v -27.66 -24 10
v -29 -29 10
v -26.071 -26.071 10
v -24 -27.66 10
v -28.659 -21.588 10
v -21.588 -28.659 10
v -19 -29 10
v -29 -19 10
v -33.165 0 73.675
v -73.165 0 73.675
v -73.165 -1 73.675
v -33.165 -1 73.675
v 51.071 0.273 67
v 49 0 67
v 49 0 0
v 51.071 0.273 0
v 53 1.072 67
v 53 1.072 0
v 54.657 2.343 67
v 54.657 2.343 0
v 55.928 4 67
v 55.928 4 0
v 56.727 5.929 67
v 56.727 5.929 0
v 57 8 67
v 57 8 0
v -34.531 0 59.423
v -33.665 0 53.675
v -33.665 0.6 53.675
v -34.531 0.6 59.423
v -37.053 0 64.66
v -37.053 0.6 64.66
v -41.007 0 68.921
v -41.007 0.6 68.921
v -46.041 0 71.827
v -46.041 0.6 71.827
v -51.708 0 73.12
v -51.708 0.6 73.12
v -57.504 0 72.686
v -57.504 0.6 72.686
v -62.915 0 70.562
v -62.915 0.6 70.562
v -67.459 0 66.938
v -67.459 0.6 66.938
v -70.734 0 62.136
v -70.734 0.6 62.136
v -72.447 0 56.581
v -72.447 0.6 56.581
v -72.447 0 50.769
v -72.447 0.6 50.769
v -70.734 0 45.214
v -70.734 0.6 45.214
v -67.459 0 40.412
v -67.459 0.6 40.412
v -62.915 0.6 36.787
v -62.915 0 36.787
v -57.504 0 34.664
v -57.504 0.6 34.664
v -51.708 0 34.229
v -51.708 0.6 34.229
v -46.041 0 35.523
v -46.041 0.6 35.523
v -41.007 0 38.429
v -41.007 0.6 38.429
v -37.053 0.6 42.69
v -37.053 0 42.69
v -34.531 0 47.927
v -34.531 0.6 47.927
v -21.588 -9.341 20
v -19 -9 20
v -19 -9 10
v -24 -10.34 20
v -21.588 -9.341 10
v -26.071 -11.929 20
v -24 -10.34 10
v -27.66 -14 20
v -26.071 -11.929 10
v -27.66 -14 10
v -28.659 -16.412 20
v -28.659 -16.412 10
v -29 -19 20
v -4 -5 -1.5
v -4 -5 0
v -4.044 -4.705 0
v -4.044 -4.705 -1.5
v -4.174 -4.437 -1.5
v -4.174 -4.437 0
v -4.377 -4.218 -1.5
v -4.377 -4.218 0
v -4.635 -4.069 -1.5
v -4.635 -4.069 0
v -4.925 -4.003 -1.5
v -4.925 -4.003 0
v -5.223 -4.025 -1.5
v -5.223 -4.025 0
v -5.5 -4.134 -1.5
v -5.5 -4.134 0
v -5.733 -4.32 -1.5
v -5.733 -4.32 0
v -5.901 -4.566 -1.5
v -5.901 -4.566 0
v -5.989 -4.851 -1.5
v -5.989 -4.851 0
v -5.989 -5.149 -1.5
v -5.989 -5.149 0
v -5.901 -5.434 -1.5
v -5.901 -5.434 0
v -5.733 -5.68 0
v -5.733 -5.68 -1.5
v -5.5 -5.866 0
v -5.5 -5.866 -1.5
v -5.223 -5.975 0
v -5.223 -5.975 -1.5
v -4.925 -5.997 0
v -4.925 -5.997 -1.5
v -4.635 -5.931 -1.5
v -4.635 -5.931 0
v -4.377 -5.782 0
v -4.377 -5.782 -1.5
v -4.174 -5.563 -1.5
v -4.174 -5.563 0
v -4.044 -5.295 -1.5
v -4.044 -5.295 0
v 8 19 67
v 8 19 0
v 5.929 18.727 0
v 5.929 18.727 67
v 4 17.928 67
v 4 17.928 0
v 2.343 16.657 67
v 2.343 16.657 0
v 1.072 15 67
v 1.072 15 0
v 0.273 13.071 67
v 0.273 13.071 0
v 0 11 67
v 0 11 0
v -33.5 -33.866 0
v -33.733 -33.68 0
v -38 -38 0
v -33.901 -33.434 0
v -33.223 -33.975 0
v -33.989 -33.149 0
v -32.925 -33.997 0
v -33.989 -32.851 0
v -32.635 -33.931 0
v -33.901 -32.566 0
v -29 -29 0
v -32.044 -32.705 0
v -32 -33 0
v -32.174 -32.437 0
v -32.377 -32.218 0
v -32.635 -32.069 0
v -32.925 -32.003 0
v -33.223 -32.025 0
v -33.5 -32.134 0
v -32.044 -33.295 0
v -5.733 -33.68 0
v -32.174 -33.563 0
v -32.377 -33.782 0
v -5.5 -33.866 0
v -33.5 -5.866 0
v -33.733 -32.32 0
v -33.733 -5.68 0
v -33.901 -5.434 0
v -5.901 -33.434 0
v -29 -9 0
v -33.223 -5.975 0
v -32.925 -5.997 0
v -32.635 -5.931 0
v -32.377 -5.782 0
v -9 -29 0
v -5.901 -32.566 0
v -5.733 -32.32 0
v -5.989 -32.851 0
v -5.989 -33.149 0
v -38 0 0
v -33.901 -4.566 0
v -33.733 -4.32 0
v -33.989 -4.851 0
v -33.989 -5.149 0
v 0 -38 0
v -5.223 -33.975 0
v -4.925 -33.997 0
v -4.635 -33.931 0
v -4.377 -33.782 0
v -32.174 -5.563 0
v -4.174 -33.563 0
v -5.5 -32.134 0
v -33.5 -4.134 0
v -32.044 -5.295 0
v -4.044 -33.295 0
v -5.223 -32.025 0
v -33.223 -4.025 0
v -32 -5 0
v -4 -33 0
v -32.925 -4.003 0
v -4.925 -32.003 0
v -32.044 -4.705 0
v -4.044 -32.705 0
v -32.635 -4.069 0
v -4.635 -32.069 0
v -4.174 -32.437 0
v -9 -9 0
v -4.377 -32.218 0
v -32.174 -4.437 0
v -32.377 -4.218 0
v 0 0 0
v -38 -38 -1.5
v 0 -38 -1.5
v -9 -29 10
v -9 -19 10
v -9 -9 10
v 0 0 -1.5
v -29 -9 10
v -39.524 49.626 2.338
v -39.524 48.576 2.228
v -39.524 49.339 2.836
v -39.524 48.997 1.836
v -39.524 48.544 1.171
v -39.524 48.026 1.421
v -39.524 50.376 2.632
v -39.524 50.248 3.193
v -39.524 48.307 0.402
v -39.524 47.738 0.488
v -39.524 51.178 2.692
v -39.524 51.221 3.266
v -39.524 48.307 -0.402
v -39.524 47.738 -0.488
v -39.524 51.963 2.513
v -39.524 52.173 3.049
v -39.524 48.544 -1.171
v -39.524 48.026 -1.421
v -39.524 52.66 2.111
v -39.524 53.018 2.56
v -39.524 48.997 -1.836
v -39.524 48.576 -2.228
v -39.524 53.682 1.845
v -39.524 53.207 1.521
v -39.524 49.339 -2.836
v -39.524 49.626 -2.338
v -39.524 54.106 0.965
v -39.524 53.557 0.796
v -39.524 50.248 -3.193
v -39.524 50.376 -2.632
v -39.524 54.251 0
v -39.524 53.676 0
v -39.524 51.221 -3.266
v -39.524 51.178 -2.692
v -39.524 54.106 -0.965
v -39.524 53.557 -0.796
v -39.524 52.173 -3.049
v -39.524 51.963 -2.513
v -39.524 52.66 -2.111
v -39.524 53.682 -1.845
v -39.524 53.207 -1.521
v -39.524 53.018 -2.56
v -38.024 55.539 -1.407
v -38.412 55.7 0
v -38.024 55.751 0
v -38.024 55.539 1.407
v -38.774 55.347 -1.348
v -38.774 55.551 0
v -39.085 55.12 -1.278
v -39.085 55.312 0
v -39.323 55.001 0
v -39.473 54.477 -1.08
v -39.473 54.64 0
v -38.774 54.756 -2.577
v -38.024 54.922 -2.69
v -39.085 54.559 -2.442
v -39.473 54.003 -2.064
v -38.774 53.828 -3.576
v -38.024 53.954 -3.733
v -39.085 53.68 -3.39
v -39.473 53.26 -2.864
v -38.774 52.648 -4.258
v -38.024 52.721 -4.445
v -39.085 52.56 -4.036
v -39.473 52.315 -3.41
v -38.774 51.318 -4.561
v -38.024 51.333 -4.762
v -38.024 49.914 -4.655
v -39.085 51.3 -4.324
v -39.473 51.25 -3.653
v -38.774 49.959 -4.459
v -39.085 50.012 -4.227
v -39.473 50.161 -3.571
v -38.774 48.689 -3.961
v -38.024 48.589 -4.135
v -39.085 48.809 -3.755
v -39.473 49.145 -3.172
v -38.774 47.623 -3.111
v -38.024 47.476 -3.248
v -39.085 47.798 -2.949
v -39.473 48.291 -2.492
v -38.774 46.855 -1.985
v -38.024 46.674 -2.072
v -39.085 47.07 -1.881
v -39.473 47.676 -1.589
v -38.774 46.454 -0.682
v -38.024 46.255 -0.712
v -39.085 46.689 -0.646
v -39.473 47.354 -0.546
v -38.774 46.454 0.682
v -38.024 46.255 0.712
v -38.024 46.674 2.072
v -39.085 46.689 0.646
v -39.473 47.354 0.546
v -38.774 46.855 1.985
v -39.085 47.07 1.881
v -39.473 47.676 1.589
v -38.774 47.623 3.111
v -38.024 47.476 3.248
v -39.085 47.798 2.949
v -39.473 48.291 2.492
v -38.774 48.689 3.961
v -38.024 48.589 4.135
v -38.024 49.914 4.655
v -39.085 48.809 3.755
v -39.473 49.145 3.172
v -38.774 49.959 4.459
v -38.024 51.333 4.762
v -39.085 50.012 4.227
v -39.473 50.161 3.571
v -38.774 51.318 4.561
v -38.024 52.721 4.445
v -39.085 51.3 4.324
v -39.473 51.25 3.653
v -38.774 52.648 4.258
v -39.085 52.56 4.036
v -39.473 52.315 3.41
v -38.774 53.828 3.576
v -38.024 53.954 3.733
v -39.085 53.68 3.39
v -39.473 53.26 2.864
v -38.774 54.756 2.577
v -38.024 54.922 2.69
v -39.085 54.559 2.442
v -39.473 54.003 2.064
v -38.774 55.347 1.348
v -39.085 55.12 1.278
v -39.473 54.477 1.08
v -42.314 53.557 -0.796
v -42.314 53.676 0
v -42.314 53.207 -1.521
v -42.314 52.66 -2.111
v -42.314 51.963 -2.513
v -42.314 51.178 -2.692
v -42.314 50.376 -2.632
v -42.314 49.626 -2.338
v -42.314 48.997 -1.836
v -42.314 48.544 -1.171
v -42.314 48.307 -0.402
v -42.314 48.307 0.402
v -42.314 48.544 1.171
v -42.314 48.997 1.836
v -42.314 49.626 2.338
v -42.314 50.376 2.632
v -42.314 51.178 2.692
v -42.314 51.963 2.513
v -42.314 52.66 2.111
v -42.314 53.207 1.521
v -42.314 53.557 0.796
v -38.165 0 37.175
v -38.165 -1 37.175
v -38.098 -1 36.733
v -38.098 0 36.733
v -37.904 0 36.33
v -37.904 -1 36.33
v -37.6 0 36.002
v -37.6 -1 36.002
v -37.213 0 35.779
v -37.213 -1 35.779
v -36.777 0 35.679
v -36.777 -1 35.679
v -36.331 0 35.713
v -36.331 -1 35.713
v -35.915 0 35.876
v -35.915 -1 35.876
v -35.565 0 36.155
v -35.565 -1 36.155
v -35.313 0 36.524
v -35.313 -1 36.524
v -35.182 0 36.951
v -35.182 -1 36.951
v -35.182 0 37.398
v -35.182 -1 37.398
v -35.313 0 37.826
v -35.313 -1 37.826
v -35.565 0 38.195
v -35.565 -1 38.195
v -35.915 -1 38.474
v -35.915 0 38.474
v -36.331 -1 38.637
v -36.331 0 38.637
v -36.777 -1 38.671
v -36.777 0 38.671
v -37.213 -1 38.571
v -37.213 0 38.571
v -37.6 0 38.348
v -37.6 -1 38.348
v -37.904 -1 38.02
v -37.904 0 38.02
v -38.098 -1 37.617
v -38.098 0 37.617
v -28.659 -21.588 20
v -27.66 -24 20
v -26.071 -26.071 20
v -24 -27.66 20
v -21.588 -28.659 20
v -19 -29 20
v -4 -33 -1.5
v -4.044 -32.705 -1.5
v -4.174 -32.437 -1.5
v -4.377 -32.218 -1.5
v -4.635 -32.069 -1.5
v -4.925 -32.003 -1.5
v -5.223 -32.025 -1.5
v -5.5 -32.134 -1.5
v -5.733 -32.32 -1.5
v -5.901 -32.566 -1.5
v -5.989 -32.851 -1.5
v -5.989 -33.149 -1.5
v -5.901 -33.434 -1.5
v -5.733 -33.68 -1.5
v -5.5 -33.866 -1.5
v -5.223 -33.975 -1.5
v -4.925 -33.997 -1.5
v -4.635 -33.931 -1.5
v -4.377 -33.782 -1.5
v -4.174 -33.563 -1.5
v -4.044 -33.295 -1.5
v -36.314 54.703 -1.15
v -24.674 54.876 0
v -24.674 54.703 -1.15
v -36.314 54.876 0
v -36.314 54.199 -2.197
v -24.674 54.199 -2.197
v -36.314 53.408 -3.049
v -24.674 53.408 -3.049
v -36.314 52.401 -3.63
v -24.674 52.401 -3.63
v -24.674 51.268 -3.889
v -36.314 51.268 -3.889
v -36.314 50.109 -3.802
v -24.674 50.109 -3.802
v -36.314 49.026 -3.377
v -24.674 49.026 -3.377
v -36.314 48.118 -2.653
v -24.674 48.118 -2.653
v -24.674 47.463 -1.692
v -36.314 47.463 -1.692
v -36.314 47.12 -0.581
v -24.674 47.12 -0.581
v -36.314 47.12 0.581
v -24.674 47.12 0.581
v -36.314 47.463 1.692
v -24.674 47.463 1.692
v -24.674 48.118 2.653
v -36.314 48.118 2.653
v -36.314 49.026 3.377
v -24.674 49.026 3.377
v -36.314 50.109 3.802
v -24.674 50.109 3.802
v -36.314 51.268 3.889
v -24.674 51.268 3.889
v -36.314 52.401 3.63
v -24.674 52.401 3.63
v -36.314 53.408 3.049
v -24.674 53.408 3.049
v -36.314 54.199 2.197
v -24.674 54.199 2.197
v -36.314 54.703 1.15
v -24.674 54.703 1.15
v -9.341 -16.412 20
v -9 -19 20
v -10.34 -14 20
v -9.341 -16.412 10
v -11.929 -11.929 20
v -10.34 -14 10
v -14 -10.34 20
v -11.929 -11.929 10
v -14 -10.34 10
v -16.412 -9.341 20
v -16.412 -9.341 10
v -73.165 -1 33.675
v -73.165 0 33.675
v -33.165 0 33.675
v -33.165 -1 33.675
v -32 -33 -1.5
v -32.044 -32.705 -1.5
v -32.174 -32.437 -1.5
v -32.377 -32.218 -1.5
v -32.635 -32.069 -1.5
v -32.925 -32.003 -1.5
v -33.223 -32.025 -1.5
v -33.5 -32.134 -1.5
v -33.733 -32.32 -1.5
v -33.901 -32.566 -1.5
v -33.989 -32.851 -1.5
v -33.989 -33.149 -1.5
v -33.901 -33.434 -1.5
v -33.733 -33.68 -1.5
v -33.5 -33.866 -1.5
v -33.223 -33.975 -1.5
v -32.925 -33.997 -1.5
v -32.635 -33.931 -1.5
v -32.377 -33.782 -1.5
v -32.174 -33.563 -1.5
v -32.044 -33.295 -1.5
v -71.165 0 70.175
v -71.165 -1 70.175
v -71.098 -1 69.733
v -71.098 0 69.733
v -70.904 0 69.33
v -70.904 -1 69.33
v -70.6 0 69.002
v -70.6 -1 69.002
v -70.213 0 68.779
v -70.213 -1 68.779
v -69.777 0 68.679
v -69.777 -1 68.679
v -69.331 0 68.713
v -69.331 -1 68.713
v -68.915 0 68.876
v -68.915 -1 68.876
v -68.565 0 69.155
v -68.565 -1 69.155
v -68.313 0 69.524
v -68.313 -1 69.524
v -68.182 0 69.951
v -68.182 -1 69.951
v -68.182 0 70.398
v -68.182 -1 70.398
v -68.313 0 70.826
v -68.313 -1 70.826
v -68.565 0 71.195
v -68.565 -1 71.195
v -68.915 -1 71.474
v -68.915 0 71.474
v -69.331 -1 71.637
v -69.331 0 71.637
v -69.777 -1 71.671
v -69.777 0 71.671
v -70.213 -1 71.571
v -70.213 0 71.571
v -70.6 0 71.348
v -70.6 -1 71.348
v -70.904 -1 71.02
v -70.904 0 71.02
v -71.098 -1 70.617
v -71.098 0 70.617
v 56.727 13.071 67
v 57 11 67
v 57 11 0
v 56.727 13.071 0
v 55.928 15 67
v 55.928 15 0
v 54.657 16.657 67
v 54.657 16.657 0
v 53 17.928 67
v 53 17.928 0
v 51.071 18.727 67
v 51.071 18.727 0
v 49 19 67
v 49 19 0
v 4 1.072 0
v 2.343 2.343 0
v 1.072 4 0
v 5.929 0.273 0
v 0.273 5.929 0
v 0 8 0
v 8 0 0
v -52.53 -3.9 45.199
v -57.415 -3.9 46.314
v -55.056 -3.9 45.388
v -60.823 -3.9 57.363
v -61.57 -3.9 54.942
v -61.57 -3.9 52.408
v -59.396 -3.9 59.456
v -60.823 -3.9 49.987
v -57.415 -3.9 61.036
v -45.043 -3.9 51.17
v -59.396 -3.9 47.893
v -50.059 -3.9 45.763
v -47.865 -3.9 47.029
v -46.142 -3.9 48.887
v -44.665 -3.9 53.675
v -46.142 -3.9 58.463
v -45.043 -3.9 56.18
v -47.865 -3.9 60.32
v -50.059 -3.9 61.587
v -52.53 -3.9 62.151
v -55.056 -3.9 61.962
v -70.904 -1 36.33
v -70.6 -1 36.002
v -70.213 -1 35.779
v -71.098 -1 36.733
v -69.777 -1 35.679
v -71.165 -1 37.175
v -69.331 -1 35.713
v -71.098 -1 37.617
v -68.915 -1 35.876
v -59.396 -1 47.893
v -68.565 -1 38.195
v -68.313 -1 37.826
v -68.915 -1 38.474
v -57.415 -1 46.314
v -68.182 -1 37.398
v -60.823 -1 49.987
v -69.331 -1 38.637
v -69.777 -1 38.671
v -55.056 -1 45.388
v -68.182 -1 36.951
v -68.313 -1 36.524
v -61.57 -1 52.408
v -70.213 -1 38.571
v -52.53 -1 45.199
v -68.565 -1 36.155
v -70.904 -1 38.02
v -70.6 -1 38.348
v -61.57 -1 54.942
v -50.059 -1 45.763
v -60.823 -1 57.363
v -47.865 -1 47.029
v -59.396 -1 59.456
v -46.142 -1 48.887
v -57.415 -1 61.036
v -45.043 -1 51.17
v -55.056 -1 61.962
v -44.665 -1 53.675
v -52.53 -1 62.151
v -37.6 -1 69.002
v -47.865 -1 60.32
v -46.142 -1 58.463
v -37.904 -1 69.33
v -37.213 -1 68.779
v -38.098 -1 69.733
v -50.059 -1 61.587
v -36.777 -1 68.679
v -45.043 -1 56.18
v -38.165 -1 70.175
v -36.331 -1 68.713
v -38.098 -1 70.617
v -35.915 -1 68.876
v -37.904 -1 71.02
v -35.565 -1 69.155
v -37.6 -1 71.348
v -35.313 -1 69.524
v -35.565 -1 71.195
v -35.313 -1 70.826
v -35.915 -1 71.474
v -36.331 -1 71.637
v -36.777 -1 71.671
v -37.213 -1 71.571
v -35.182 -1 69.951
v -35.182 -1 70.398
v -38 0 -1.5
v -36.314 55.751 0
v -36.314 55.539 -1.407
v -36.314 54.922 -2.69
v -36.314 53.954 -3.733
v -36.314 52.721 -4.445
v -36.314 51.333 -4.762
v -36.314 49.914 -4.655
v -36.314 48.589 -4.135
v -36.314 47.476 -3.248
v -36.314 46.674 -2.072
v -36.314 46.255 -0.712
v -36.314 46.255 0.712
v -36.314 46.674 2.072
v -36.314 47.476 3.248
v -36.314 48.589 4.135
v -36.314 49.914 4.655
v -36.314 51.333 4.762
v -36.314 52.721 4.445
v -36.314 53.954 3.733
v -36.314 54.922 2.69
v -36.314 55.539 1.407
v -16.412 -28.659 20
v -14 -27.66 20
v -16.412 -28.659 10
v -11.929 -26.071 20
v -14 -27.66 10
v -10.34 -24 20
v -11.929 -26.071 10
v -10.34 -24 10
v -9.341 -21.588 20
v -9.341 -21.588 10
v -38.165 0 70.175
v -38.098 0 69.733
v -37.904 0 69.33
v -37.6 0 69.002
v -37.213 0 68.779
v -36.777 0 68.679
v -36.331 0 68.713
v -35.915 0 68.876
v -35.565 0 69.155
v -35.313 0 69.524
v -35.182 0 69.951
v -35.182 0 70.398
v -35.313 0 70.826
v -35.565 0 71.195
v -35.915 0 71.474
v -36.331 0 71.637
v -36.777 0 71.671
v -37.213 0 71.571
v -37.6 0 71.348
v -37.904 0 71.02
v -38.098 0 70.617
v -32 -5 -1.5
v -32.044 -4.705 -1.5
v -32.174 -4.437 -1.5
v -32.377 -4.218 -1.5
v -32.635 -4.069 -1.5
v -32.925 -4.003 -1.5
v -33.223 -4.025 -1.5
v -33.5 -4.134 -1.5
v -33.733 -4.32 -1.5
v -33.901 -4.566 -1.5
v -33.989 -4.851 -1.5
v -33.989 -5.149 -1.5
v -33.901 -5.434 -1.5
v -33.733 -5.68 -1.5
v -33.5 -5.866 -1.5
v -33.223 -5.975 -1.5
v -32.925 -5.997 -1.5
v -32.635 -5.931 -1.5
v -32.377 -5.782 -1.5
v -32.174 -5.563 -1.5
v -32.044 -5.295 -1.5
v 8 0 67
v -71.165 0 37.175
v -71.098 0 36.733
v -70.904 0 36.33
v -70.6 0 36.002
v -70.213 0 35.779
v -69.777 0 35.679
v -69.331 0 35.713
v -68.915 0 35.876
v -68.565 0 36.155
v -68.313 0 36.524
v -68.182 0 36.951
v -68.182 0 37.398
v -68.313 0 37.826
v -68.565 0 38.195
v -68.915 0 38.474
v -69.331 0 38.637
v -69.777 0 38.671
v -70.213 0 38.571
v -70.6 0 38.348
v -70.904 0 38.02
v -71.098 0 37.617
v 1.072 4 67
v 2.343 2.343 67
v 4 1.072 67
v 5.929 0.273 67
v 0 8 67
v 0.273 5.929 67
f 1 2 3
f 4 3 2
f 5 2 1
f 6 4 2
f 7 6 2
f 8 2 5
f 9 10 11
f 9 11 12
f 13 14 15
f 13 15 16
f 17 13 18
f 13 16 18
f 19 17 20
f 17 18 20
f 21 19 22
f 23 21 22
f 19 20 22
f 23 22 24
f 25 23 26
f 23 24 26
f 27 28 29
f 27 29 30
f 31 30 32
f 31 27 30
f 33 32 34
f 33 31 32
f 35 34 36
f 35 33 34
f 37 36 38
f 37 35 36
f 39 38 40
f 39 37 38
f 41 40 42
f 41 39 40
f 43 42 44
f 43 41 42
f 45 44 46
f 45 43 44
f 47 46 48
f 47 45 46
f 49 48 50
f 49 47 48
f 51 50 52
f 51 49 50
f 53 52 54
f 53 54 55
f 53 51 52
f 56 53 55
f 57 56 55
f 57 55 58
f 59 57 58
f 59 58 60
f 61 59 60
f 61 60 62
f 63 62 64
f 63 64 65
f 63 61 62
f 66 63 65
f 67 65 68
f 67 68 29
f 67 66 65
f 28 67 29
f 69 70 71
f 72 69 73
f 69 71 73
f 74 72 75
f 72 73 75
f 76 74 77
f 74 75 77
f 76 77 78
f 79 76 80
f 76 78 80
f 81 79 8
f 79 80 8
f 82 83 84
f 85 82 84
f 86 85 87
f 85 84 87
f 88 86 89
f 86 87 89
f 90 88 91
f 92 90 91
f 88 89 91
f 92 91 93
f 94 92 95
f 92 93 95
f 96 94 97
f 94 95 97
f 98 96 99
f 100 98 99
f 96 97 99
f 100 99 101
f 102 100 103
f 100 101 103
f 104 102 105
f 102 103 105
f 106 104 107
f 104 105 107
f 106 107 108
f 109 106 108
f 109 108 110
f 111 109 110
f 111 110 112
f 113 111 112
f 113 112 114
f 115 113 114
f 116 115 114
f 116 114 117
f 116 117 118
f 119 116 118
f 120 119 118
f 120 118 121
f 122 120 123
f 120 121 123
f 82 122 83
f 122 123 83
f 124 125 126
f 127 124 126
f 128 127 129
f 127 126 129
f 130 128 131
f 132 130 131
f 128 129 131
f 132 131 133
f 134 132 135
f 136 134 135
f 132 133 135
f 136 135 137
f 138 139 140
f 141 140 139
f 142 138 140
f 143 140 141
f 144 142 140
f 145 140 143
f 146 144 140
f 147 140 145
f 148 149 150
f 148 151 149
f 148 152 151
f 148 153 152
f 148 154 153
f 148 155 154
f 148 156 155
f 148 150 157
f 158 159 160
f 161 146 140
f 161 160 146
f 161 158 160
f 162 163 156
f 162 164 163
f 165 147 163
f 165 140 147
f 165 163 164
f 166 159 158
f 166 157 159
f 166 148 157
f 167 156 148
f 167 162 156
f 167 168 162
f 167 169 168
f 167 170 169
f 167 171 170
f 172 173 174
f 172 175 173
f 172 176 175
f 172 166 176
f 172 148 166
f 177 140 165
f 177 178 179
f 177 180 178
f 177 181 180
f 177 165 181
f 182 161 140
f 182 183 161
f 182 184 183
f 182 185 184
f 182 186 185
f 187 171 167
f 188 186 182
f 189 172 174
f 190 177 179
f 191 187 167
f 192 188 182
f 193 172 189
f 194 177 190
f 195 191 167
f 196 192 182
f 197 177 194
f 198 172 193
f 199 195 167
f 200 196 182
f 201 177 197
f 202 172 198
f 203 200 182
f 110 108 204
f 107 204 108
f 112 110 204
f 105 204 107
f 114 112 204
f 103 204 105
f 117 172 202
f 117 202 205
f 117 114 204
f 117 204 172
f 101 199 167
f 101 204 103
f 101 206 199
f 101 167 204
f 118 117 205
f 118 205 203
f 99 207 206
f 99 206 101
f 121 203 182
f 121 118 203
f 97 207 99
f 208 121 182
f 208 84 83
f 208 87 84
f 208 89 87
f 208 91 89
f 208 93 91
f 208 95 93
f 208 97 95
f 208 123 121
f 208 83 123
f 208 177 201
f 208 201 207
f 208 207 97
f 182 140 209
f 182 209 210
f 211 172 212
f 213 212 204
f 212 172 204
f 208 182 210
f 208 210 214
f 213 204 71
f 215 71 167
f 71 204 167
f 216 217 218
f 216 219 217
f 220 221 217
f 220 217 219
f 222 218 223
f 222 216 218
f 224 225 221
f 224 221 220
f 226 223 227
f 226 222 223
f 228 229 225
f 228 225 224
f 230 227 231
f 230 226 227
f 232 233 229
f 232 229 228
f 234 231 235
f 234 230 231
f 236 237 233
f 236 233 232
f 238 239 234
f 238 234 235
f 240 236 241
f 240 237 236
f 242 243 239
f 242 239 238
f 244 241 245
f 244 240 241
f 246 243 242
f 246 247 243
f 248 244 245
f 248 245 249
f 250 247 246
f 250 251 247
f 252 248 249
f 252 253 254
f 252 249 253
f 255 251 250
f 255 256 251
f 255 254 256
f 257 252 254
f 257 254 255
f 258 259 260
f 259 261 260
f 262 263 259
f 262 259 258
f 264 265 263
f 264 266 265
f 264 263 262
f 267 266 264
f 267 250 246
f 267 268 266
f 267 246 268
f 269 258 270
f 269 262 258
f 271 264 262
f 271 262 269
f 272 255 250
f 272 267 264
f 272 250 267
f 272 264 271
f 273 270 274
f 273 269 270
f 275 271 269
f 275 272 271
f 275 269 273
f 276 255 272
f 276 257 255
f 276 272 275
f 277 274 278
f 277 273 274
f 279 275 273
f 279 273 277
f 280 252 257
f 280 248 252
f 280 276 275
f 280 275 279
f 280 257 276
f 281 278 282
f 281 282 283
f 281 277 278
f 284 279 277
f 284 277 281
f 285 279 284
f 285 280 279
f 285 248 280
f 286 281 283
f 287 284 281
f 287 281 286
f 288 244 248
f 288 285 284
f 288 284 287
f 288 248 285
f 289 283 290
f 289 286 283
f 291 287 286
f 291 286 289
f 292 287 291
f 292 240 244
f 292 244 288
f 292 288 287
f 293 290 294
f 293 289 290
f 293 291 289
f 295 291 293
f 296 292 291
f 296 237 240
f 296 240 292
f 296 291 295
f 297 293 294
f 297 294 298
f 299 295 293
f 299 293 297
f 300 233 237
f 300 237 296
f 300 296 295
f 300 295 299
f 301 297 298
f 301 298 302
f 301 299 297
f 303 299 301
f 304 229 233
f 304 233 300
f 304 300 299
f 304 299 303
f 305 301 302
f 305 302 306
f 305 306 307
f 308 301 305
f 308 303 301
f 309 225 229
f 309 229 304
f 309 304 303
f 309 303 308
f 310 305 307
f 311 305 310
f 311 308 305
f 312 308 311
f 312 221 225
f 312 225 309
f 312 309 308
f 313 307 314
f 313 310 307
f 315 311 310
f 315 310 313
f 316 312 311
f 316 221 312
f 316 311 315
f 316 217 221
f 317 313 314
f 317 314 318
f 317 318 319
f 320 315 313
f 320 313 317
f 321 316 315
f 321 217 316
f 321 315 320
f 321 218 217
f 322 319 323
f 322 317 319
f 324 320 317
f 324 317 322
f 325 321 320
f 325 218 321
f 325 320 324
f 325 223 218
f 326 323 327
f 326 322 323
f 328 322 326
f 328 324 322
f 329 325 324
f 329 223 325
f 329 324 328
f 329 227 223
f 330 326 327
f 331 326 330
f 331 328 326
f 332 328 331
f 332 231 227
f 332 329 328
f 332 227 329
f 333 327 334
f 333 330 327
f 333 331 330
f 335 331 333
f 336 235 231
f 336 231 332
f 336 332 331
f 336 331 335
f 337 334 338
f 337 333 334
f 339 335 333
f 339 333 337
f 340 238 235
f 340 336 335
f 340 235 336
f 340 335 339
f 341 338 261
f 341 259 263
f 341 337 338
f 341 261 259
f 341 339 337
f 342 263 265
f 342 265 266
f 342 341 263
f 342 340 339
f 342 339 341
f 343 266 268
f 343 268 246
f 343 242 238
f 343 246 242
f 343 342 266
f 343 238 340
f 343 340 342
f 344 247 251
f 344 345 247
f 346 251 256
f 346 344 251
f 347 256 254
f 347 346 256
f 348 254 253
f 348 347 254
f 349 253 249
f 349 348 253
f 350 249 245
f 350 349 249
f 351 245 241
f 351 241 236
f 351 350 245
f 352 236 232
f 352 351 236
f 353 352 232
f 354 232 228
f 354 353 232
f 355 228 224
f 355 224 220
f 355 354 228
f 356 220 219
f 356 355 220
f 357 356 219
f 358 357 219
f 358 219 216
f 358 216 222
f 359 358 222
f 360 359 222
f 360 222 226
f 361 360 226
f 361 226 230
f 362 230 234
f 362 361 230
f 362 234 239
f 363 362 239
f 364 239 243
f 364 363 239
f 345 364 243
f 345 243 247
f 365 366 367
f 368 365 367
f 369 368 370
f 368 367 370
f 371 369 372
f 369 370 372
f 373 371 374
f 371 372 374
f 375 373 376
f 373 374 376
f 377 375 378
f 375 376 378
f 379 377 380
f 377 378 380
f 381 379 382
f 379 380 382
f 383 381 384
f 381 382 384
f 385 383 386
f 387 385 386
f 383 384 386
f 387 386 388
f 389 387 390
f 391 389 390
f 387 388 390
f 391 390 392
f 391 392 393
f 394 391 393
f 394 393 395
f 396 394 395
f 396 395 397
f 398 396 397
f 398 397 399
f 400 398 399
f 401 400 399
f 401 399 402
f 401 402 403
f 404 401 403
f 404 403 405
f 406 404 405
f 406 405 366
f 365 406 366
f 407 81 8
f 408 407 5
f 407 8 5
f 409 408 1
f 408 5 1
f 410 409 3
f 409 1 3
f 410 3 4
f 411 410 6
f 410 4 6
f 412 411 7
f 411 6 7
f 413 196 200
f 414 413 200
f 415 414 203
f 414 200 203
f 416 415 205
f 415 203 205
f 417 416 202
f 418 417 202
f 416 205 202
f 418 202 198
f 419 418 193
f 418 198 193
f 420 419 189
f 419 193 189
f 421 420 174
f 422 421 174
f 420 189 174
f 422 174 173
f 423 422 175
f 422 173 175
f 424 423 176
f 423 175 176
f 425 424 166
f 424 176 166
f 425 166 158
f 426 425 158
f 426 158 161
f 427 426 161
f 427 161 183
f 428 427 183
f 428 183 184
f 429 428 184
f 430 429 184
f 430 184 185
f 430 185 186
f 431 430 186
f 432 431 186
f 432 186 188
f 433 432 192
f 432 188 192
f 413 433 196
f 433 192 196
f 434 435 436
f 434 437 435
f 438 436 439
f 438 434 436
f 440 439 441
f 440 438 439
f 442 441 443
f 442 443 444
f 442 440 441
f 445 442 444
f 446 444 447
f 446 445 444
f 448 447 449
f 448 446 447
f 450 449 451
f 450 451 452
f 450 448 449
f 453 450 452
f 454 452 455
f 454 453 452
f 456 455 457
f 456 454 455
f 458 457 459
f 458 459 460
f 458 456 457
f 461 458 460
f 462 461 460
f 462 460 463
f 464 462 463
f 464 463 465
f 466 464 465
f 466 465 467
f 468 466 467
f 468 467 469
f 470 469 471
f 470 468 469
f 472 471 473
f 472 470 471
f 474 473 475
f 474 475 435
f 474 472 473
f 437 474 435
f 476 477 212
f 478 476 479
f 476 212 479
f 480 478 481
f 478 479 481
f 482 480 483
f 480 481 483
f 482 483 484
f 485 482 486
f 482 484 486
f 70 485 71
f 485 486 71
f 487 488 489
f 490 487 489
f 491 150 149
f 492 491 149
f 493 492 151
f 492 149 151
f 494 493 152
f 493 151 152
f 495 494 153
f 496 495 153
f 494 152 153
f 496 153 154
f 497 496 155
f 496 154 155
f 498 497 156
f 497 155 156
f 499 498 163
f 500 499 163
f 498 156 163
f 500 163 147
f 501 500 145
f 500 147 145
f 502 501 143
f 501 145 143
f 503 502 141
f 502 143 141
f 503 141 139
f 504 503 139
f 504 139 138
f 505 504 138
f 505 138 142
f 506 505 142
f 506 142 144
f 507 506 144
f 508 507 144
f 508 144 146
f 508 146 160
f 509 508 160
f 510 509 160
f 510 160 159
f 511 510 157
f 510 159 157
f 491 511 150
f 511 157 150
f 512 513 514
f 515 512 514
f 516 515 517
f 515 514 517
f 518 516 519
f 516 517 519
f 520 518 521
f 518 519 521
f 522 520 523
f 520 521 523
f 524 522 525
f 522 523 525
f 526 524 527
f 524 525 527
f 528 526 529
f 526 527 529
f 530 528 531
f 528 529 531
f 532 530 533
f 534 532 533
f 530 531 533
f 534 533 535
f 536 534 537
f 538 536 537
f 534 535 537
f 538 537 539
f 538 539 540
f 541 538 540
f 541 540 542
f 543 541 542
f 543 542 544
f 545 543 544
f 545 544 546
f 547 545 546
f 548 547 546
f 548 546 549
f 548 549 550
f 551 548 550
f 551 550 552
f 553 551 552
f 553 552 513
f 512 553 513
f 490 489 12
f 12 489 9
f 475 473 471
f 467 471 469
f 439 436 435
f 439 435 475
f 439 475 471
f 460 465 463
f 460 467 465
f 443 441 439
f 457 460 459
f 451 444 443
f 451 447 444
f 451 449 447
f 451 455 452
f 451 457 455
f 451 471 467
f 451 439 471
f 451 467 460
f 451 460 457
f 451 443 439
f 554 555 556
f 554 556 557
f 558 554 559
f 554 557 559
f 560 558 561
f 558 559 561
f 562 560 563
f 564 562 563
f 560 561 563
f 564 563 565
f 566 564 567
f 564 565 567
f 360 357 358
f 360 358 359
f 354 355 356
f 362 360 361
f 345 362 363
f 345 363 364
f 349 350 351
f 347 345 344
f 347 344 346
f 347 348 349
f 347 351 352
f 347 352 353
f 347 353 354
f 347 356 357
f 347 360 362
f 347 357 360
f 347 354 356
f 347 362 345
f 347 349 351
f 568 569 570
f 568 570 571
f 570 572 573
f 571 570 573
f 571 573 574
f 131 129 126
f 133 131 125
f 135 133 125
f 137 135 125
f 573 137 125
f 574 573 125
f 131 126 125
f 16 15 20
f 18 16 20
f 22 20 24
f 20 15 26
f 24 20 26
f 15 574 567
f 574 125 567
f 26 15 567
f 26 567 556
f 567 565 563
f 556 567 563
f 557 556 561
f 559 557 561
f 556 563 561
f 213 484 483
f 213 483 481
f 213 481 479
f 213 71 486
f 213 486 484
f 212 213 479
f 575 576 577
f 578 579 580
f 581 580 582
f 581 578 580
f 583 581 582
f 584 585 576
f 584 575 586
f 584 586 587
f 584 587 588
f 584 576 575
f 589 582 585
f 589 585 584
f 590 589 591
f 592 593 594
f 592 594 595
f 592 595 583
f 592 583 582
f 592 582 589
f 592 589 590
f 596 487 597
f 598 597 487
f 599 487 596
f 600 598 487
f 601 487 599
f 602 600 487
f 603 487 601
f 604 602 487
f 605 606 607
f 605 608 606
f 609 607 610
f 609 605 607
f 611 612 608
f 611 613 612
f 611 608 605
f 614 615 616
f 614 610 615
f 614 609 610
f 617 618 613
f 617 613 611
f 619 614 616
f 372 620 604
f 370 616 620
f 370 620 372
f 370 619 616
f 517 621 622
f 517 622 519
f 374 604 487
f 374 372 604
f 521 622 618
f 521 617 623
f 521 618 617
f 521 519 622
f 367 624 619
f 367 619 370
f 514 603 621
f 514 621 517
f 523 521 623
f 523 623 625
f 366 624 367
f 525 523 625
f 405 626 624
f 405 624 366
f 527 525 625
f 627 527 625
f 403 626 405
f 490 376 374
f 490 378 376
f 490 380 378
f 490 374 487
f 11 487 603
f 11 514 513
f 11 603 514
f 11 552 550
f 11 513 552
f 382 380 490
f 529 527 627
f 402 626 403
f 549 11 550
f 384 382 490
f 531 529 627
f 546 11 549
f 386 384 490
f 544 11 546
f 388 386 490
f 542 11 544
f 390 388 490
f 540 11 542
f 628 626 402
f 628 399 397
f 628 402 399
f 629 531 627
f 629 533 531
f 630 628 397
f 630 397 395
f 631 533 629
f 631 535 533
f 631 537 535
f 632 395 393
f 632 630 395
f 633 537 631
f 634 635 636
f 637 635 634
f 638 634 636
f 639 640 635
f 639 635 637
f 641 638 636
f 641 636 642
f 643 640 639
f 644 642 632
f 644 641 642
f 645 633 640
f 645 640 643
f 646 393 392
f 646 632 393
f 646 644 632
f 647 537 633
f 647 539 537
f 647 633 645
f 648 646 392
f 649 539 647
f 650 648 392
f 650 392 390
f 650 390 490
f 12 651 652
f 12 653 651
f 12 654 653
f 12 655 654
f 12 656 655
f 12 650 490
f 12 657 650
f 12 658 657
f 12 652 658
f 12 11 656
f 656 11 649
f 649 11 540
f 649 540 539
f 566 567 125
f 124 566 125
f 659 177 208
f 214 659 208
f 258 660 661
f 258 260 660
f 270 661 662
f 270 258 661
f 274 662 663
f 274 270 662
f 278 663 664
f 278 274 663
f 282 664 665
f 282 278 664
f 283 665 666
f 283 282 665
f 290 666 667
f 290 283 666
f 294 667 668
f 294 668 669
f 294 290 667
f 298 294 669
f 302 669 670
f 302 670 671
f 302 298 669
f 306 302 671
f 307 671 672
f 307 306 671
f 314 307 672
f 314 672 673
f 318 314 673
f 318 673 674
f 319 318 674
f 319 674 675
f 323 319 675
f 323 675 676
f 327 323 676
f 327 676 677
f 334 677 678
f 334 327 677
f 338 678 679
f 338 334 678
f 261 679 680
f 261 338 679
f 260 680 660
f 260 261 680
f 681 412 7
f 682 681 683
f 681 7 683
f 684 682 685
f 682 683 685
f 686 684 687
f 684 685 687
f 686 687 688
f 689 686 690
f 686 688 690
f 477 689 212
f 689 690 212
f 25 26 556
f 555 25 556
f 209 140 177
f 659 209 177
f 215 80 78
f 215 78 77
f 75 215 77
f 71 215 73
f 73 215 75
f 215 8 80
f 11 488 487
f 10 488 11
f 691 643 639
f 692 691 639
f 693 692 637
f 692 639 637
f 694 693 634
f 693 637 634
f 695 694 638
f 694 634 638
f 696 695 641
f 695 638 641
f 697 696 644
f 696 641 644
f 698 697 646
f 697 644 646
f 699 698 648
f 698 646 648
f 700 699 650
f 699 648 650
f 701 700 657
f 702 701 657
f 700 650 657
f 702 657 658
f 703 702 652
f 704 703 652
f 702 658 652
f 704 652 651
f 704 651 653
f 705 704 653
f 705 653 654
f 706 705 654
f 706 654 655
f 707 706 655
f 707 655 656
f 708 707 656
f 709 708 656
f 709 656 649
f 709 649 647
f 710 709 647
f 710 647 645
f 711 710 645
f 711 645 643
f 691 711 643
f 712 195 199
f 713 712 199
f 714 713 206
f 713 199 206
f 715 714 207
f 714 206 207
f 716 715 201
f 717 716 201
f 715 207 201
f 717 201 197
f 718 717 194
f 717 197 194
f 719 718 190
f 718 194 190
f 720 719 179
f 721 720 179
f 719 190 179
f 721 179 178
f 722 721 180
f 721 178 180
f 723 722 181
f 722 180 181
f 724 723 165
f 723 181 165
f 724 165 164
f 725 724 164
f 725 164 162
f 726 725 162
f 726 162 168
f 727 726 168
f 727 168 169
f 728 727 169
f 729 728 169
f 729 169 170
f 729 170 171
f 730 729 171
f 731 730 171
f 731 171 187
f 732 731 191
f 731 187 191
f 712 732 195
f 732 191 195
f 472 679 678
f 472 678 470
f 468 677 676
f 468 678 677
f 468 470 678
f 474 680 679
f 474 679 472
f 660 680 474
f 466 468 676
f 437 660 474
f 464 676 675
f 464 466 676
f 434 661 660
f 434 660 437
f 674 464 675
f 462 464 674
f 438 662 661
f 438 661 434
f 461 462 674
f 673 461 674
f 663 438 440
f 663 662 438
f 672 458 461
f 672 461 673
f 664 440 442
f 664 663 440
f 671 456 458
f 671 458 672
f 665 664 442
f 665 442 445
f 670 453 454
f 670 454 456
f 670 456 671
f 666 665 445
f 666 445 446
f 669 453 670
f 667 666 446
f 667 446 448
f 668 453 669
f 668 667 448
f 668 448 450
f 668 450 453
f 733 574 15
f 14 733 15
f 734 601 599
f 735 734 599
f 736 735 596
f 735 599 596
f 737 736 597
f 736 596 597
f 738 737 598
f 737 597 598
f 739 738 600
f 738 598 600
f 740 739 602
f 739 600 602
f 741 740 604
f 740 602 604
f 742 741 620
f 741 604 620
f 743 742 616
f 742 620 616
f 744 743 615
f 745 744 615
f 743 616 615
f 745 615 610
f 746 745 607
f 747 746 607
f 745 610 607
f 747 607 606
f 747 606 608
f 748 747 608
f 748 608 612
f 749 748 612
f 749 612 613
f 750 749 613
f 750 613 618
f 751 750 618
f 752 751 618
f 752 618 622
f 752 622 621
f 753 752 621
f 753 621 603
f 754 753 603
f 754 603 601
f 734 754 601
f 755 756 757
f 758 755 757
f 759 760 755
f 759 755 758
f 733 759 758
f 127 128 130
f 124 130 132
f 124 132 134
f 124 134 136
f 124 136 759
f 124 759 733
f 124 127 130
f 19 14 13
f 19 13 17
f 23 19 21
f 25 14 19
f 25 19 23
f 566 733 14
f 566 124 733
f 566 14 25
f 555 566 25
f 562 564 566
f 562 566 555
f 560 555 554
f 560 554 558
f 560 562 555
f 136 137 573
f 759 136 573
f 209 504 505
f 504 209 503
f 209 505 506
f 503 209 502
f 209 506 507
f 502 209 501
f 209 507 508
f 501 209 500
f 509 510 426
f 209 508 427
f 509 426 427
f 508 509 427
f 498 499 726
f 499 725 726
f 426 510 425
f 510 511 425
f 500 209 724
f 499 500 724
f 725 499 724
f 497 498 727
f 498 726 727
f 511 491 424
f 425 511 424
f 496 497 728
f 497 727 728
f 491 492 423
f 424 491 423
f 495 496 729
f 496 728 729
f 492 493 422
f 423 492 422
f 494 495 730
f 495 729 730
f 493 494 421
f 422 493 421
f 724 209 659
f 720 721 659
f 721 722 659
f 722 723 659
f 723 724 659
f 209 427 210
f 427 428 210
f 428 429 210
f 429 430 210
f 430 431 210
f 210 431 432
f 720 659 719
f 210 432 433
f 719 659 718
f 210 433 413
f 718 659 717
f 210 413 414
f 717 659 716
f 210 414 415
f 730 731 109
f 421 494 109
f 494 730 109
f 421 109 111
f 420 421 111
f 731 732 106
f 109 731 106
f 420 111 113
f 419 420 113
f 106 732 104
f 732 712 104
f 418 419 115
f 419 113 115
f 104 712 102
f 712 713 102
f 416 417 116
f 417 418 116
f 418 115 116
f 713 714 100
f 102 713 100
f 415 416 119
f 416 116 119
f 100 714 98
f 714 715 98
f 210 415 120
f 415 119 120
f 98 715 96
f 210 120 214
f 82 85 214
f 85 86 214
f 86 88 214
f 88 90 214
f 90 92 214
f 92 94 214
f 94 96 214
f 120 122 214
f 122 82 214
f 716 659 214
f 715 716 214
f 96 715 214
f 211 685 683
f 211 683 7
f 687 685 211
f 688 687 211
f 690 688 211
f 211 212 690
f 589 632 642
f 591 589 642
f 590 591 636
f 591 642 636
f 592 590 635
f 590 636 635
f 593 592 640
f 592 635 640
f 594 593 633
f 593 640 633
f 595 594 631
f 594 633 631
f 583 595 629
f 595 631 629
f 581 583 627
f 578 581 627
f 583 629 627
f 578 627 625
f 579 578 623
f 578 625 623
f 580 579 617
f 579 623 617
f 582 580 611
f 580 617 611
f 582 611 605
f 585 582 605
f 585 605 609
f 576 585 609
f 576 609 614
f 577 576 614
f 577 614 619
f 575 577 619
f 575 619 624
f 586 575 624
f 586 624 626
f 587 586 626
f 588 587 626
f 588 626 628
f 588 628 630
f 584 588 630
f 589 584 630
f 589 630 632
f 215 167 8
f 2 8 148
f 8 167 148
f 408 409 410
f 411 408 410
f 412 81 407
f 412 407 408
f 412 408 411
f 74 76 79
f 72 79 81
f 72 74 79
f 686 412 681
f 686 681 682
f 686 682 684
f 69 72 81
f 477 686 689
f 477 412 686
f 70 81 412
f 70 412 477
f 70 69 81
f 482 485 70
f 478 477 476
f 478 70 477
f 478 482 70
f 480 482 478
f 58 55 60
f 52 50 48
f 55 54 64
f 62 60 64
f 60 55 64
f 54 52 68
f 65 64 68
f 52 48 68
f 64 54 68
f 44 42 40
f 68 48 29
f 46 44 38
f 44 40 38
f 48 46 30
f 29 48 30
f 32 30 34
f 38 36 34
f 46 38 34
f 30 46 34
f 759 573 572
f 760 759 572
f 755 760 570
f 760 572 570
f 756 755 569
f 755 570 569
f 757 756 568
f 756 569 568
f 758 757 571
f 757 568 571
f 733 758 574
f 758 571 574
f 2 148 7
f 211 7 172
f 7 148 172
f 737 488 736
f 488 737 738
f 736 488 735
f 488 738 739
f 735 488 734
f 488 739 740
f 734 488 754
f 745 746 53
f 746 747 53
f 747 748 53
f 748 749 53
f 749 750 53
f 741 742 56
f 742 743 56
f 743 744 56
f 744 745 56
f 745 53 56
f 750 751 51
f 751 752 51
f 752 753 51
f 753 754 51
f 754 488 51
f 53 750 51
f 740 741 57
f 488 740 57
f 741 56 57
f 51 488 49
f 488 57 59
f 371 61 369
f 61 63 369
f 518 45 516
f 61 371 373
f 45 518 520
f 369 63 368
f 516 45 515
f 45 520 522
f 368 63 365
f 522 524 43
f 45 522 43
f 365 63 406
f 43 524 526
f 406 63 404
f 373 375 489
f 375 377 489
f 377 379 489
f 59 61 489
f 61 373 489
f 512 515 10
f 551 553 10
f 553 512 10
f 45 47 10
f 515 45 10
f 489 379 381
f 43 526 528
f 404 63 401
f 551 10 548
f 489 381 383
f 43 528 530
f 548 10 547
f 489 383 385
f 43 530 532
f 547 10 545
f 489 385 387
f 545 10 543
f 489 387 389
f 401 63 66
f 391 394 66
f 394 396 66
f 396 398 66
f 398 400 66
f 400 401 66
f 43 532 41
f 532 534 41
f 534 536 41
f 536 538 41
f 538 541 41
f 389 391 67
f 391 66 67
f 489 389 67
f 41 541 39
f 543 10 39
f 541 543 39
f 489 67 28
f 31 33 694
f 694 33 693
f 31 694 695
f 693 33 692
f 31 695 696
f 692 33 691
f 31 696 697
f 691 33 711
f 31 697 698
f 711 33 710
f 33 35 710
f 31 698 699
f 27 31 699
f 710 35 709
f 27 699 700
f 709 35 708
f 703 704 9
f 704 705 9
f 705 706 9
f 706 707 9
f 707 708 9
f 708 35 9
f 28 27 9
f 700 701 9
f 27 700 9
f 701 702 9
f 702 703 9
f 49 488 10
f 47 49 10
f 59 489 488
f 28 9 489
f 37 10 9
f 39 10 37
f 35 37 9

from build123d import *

# Parameters (mm, degrees)
F1_DEPTH = 67
F2_W     = 38
F2_H     = 38
F2_R     = 1
F3_DEPTH = 1.5
F4_DEPTH = 10
F5_DEPTH = 20
F6_W     = 40
F6_H     = 40
F6_R     = 19.5
F6_R_2   = 8.5
F7_DEPTH = 1
F8_DEPTH = 0.6
F9_DEPTH = 3.9
F10_D    = 3


with BuildPart() as f1:
    # F0 (on Top) → F1 (new body)
    with BuildSketch(Plane.XY):
        with BuildLine():
            ThreePointArc((0, 8), (2.3431457505, 2.3431457505), (8, 0))
            Line((8, 0), (49, 0))
            ThreePointArc((49, 0), (54.6568542495, 2.3431457505), (57, 8))
            Line((57, 8), (57, 11))
            ThreePointArc((57, 11), (54.6568542495, 16.6568542495), (49, 19))
            Line((49, 19), (8, 19))
            ThreePointArc((8, 19), (2.3431457505, 16.6568542495), (0, 11))
            Line((0, 11), (0, 8))
        make_face()
    extrude(amount=F1_DEPTH)


with BuildPart() as f3:
    # F2 (on Top) → F3 (new body)
    with BuildSketch(Plane.XY):
        with Locations((-19, -19)):
            Rectangle(F2_W, F2_H)
        with Locations((-33, -33)):
            Circle(F2_R, mode=Mode.SUBTRACT)
        with Locations((-5, -33)):
            Circle(F2_R, mode=Mode.SUBTRACT)
        with Locations((-33, -5)):
            Circle(F2_R, mode=Mode.SUBTRACT)
        Polygon((-29, -19), (-29, -9), (-19, -9), (-9, -9), (-9, -19), (-9, -29), (-19, -29), (-29, -29), align=None, mode=Mode.SUBTRACT)
        with Locations((-5, -5)):
            Circle(F2_R, mode=Mode.SUBTRACT)
        with BuildLine():
            Line((-19, -9), (-29, -9))
            Line((-29, -9), (-29, -19))
            ThreePointArc((-29, -19), (-26.0710678119, -11.9289321881), (-19, -9))
        make_face()
        with BuildLine():
            Line((-9, -9), (-19, -9))
            ThreePointArc((-19, -9), (-11.9289321881, -11.9289321881), (-9, -19))
            Line((-9, -19), (-9, -9))
        make_face()
        with BuildLine():
            ThreePointArc((-9, -19), (-11.9289321881, -11.9289321881), (-19, -9))
            ThreePointArc((-19, -9), (-26.0710678119, -11.9289321881), (-29, -19))
            ThreePointArc((-29, -19), (-26.0710678119, -26.0710678119), (-19, -29))
            ThreePointArc((-19, -29), (-11.9289321881, -26.0710678119), (-9, -19))
        make_face()
        with BuildLine():
            ThreePointArc((-19, -29), (-26.0710678119, -26.0710678119), (-29, -19))
            Line((-29, -19), (-29, -29))
            Line((-29, -29), (-19, -29))
        make_face()
        with BuildLine():
            Line((-9, -29), (-9, -19))
            ThreePointArc((-9, -19), (-11.9289321881, -26.0710678119), (-19, -29))
            Line((-19, -29), (-9, -29))
        make_face()
    extrude(amount=-F3_DEPTH)

    # F2 (on Top) → F4 (join)
    with BuildSketch(Plane.XY):
        with BuildLine():
            Line((-19, -9), (-29, -9))
            Line((-29, -9), (-29, -19))
            ThreePointArc((-29, -19), (-26.0710678119, -11.9289321881), (-19, -9))
        make_face()
        with BuildLine():
            Line((-9, -9), (-19, -9))
            ThreePointArc((-19, -9), (-11.9289321881, -11.9289321881), (-9, -19))
            Line((-9, -19), (-9, -9))
        make_face()
        with BuildLine():
            ThreePointArc((-19, -29), (-26.0710678119, -26.0710678119), (-29, -19))
            Line((-29, -19), (-29, -29))
            Line((-29, -29), (-19, -29))
        make_face()
        with BuildLine():
            ThreePointArc((-9, -19), (-11.9289321881, -11.9289321881), (-19, -9))
            ThreePointArc((-19, -9), (-26.0710678119, -11.9289321881), (-29, -19))
            ThreePointArc((-29, -19), (-26.0710678119, -26.0710678119), (-19, -29))
            ThreePointArc((-19, -29), (-11.9289321881, -26.0710678119), (-9, -19))
        make_face()
        with BuildLine():
            Line((-9, -29), (-9, -19))
            ThreePointArc((-9, -19), (-11.9289321881, -26.0710678119), (-19, -29))
            Line((-19, -29), (-9, -29))
        make_face()
    extrude(amount=F4_DEPTH)

    # F2 (on Top) → F5 (join)
    with BuildSketch(Plane.XY):
        with BuildLine():
            ThreePointArc((-9, -19), (-11.9289321881, -11.9289321881), (-19, -9))
            ThreePointArc((-19, -9), (-26.0710678119, -11.9289321881), (-29, -19))
            ThreePointArc((-29, -19), (-26.0710678119, -26.0710678119), (-19, -29))
            ThreePointArc((-19, -29), (-11.9289321881, -26.0710678119), (-9, -19))
        make_face()
    extrude(amount=F5_DEPTH)


with BuildPart() as f7:
    # F6 (on Front) → F7 (new body)
    with BuildSketch(Plane.XZ):
        with Locations((-53.1648937613, 53.6749299139)):
            Rectangle(F6_W, F6_H)
        with Locations((-53.1648937613, 53.6749299139)):
            Circle(F6_R, mode=Mode.SUBTRACT)
        with Locations((-53.1648937613, 53.6749299139)):
            Circle(F6_R)
        with Locations((-53.1648937613, 53.6749299139)):
            Circle(F6_R_2, mode=Mode.SUBTRACT)
        with Locations((-53.1648937613, 53.6749299139)):
            Circle(F6_R_2)
    extrude(amount=F7_DEPTH)

    # F6 (on Front) → F8 (join)
    with BuildSketch(Plane.XZ):
        with Locations((-53.1648937613, 53.6749299139)):
            Circle(F6_R)
        with Locations((-53.1648937613, 53.6749299139)):
            Circle(F6_R_2, mode=Mode.SUBTRACT)
        with Locations((-53.1648937613, 53.6749299139)):
            Circle(F6_R_2)
    extrude(amount=-F8_DEPTH)

    # F6 (on Front) → F9 (join)
    with BuildSketch(Plane.XZ):
        with Locations((-53.1648937613, 53.6749299139)):
            Circle(F6_R_2)
    extrude(amount=F9_DEPTH)

    # F10 (through all)
    with Locations(Plane(origin=(0, 0, 0), x_dir=(1, 0, 0), z_dir=(0, 1, 0))):
        with Locations((-69.6648937613, -70.1749299139), (-69.6648937613, -37.1749299139), (-36.6648937613, -37.1749299139), (-36.6648937613, -70.1749299139)):
            Hole(F10_D / 2)


with BuildPart() as f12:
    # F11 (on Top) → F12 (revolve)
    with BuildSketch(Plane.XY):
        with BuildLine():
            Line((-42.3140732824, 50.9764954408), (-24.6740732824, 50.9764954408))
            Line((-24.6740732824, 50.9764954408), (-24.6740732824, 54.8764954408))
            Line((-24.6740732824, 54.8764954408), (-36.3140732824, 54.8764954408))
            Line((-36.3140732824, 54.8764954408), (-36.3140732824, 55.7514954408))
            Line((-36.3140732824, 55.7514954408), (-38.0240732824, 55.7514954408))
            ThreePointArc((-38.0240732824, 55.7514954408), (-39.0847334542, 55.3121556126), (-39.5240732824, 54.2514954408))
            Line((-39.5240732824, 54.2514954408), (-39.5240732824, 53.6764954408))
            Line((-39.5240732824, 53.6764954408), (-42.3140732824, 53.6764954408))
            Line((-42.3140732824, 53.6764954408), (-42.3140732824, 50.9764954408))
        make_face()
    revolve(axis=Axis((-33.4940732824, 50.9764954408, 0), (-1, 0, 0)))


solid = Compound([f1.part, f3.part, f7.part, f12.part])
